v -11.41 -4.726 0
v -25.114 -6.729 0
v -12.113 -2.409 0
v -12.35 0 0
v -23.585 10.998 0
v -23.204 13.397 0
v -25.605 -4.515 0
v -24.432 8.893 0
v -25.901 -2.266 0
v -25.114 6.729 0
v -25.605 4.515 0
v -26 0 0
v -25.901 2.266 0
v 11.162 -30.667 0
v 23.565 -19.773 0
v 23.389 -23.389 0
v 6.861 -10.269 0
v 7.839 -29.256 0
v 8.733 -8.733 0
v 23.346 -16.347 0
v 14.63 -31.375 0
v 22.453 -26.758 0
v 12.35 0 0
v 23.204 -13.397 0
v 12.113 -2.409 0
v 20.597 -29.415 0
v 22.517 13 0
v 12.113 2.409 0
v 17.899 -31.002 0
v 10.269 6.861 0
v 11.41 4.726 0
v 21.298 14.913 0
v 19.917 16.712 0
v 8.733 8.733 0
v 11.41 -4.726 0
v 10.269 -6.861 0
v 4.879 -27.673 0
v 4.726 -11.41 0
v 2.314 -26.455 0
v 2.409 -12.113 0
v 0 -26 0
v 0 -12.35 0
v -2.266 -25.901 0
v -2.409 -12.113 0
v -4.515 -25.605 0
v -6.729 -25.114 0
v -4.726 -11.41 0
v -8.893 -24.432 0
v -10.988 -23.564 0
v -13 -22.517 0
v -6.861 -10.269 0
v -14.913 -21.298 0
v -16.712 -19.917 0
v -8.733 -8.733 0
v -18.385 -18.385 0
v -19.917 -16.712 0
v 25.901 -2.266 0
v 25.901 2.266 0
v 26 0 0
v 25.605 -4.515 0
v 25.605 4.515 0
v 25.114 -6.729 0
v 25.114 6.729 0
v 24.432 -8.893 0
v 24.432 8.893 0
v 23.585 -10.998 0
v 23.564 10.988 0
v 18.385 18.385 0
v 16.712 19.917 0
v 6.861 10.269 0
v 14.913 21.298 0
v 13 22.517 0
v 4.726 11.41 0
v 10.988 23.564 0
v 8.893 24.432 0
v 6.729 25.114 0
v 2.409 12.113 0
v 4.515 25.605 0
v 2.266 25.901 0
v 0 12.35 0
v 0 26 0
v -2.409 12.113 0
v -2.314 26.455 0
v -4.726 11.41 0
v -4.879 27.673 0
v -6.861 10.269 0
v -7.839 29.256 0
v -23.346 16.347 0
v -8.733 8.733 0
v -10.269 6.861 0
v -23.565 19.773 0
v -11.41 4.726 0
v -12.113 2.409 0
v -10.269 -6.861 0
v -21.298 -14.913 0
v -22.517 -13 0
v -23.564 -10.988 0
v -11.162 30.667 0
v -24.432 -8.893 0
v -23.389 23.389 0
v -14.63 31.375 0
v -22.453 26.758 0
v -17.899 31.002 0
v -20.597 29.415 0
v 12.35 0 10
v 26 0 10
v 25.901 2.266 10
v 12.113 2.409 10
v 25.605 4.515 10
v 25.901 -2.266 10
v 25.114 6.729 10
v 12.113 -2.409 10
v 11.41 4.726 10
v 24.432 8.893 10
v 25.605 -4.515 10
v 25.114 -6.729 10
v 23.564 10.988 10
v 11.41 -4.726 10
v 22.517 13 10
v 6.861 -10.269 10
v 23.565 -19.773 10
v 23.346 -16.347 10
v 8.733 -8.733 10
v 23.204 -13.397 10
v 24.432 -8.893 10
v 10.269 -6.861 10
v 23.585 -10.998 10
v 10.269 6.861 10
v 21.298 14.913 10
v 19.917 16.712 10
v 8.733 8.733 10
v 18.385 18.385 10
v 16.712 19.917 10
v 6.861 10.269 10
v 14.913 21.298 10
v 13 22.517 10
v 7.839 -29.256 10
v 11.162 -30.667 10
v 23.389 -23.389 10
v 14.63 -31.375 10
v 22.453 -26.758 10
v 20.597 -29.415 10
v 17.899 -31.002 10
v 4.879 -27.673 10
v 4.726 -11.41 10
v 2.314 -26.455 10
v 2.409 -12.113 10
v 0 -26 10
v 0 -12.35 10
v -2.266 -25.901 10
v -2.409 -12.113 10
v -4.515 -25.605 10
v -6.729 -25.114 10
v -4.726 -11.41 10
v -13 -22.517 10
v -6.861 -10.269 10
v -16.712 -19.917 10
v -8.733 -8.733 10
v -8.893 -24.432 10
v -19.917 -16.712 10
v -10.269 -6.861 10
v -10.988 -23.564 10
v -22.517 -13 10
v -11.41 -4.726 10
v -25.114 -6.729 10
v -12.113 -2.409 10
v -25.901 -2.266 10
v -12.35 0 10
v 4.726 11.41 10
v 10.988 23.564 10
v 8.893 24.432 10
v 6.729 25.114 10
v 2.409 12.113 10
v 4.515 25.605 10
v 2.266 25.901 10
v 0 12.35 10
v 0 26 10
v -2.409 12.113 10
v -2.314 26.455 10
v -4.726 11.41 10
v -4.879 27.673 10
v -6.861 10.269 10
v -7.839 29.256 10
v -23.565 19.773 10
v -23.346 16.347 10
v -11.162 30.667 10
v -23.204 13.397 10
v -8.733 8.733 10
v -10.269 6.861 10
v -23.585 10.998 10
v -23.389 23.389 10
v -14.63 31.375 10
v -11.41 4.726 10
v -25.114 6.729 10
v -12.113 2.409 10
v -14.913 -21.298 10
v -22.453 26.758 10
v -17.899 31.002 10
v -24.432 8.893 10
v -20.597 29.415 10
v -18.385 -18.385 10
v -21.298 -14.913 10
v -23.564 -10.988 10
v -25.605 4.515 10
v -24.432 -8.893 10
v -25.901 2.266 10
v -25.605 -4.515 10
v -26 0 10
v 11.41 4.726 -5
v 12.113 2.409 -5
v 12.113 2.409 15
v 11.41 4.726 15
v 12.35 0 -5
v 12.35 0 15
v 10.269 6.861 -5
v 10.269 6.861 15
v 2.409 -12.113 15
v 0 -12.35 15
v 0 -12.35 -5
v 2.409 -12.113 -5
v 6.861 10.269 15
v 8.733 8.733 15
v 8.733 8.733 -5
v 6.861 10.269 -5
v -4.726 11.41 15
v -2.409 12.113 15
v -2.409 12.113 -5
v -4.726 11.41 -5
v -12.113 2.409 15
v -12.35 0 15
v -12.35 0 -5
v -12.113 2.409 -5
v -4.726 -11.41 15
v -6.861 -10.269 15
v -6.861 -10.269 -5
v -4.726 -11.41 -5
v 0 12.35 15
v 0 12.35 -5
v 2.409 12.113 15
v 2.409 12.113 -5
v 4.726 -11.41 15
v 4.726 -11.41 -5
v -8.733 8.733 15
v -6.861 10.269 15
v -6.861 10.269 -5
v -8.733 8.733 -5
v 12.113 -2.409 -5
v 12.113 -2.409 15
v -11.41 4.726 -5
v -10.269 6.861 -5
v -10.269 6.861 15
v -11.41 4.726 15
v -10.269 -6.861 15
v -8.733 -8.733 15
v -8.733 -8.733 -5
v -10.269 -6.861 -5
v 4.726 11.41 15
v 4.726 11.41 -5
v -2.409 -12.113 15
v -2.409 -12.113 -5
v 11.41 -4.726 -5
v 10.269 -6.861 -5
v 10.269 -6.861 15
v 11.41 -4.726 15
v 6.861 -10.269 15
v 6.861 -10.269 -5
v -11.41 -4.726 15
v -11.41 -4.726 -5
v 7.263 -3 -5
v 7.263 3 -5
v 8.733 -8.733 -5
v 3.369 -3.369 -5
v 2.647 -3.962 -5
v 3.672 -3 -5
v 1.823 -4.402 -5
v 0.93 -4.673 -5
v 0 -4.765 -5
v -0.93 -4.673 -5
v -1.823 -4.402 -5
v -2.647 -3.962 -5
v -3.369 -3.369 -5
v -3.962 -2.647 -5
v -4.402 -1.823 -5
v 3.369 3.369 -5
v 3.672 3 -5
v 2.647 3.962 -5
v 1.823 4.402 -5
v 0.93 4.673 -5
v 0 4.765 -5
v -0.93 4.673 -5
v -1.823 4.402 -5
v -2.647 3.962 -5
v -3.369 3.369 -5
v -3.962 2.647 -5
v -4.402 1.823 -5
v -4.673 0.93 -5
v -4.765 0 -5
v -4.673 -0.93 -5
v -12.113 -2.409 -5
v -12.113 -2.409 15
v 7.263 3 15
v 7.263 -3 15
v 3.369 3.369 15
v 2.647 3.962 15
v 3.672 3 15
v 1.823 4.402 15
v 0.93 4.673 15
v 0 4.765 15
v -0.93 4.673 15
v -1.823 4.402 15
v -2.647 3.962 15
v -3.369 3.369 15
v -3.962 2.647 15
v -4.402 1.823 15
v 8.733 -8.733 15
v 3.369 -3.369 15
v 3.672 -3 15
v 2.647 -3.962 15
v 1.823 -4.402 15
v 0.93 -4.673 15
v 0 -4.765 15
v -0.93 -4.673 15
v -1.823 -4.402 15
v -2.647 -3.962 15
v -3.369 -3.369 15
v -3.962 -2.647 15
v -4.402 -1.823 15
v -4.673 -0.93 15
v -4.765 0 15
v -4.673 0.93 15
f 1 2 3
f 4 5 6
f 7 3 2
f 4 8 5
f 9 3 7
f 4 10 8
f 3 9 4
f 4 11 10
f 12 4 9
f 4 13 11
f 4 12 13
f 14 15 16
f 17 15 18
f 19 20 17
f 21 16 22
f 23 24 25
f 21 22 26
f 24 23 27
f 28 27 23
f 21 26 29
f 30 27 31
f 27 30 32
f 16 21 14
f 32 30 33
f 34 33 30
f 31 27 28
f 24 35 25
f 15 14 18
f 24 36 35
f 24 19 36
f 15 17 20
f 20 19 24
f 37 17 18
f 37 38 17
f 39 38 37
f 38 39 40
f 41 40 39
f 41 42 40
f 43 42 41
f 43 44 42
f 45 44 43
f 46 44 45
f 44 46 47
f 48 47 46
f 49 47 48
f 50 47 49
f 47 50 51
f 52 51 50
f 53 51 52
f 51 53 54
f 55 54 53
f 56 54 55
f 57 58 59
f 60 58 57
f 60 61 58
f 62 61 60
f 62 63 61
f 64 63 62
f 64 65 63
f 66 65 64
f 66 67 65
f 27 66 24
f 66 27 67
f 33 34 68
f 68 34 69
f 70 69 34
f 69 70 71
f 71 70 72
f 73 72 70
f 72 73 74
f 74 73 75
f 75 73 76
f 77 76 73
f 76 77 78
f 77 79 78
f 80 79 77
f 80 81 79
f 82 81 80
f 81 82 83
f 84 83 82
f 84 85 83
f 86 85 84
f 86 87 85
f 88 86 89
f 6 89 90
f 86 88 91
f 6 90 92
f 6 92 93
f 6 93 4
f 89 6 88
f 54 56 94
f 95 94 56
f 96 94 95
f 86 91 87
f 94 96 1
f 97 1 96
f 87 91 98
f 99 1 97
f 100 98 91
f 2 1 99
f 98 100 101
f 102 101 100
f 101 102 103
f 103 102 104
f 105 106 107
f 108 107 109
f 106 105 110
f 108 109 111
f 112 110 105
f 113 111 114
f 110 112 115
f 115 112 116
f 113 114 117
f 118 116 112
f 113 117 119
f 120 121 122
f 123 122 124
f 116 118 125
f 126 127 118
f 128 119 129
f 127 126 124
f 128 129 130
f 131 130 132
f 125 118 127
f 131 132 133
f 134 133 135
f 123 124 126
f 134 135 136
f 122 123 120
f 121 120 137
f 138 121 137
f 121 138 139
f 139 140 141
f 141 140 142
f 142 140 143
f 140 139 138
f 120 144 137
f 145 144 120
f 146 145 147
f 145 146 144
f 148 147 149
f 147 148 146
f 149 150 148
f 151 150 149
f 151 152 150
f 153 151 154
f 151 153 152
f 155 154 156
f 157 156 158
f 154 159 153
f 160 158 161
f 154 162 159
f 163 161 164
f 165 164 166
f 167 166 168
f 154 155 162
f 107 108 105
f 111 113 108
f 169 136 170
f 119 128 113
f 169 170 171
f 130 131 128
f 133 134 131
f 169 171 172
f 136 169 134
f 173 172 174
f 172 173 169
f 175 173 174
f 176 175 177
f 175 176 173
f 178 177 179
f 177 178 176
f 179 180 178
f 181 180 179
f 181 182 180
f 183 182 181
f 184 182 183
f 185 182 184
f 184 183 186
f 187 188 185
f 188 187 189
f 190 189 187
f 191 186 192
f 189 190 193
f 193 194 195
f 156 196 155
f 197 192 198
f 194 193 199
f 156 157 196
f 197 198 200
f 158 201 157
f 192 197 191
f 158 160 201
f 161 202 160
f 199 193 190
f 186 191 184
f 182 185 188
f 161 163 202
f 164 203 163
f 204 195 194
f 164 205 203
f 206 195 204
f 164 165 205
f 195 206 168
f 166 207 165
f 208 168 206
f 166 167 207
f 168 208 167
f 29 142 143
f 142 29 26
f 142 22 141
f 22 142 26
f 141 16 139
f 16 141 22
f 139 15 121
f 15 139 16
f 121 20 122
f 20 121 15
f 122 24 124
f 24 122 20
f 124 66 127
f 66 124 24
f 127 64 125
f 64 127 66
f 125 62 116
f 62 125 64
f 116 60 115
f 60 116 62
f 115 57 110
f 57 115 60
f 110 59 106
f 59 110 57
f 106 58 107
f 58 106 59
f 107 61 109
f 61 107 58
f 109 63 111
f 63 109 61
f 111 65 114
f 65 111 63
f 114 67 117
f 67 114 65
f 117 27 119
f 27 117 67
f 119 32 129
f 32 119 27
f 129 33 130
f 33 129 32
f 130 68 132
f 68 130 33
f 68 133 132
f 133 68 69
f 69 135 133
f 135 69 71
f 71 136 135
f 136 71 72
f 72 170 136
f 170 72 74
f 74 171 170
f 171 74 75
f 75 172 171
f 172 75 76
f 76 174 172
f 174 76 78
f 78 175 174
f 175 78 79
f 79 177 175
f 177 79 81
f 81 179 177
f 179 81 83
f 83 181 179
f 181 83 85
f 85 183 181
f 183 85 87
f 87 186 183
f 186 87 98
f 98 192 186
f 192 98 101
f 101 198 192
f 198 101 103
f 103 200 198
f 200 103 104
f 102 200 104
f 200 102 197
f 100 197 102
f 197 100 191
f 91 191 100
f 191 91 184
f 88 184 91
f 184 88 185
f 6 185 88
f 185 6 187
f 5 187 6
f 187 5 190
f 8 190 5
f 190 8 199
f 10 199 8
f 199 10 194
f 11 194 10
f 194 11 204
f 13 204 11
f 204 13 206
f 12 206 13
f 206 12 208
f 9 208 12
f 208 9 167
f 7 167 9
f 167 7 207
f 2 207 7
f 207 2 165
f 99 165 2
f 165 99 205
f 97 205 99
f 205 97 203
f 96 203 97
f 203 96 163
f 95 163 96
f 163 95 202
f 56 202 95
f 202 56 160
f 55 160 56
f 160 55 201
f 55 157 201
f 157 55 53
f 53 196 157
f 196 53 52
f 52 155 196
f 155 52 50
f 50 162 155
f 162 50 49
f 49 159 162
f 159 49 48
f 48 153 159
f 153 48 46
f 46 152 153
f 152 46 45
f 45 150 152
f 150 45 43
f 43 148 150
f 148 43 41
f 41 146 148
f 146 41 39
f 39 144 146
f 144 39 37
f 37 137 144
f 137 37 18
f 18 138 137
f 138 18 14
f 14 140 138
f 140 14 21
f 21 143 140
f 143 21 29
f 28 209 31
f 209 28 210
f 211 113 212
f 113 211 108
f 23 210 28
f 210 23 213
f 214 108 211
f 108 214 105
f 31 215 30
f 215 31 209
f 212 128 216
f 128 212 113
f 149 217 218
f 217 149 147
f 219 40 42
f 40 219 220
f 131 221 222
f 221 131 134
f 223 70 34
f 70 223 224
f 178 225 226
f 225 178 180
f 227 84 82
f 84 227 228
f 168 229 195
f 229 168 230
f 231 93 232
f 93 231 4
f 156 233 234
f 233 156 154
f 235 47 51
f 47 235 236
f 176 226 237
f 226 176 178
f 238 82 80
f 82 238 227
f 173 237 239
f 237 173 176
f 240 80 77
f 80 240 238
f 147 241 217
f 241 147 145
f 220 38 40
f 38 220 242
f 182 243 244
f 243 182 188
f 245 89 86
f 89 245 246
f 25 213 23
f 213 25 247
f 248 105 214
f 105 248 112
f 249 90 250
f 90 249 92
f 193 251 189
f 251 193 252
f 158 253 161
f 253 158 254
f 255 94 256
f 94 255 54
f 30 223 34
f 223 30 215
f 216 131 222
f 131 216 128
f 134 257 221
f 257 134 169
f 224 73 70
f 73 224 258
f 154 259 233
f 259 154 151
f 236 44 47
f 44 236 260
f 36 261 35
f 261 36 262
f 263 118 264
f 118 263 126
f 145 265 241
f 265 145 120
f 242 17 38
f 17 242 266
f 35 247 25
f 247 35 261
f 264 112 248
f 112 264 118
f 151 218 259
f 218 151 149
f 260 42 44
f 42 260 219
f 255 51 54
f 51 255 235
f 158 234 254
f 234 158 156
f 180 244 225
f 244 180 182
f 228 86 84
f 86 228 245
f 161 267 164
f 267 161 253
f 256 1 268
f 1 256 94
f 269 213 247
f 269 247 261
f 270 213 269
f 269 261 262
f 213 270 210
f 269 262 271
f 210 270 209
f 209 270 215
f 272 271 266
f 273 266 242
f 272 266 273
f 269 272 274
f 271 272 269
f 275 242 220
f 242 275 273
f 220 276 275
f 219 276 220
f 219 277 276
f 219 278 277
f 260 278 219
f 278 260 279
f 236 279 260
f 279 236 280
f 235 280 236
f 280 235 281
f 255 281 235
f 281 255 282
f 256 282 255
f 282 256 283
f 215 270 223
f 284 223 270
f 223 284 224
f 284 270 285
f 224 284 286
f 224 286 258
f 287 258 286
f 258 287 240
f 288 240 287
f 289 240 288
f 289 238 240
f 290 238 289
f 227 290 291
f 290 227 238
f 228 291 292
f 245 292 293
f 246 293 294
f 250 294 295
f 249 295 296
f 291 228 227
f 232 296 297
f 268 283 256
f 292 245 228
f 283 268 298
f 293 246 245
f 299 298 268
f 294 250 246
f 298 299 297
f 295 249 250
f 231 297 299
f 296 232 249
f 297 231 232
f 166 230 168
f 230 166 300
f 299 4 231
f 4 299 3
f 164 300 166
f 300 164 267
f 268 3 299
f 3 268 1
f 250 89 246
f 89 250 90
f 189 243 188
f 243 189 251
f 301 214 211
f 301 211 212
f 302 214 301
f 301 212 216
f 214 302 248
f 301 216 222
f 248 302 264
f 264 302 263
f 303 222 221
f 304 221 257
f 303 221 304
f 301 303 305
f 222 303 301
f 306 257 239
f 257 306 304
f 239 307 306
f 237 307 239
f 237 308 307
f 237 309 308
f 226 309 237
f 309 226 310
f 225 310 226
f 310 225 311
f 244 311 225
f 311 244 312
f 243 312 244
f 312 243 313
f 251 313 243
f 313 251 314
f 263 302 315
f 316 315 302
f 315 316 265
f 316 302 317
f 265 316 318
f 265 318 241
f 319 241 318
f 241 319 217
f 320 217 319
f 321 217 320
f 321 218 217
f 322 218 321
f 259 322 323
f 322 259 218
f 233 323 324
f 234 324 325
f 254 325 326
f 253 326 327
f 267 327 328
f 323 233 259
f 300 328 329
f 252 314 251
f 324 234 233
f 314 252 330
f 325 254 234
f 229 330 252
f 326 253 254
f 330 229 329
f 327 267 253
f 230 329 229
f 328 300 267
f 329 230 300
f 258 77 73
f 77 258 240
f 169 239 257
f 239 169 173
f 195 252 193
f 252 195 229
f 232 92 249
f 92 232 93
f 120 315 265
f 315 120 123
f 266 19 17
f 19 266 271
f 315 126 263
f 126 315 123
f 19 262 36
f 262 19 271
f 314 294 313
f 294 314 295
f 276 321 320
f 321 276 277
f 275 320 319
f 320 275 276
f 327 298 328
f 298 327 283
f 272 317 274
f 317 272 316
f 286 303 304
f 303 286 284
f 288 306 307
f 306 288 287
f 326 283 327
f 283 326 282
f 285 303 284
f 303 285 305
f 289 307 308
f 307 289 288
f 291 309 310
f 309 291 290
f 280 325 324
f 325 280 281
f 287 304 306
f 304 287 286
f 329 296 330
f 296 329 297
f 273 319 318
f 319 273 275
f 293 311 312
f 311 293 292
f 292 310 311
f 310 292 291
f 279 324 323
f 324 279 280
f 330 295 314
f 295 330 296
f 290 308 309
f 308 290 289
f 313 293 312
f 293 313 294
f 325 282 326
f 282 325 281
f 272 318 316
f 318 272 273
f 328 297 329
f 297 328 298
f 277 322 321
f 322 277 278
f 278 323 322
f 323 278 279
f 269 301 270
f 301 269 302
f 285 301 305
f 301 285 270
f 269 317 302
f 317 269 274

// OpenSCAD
$fn = 32;

// ----------------------------------------------------------------------
// Cam: base radius 26 mm with a 10 mm lift over 120 degrees
// ----------------------------------------------------------------------

// --- parameters (mm) ---
base_r = 26;              // base radius
lift = 10;                // lift height above the base radius
lift_span = 120;          // angular width of the lift
lift_start = 90;          // angle where the lift starts
cam_t = 10;               // cam plate thickness
hub_d = 24.7;             // hub diameter
hub_h = 20;               // hub height
bore_d = 9.53;            // bore
key_w = 6;                // keyway width
key_depth = 3;            // keyway depth

cam_profile = [[26, 0], [25.901, 2.266], [25.605, 4.515], [25.114, 6.729], [24.432, 8.893], [23.564, 10.988], [22.517, 13], [21.298, 14.913], [19.917, 16.712], [18.385, 18.385], [16.712, 19.917], [14.913, 21.298], [13, 22.517], [10.988, 23.564], [8.893, 24.432], [6.729, 25.114], [4.515, 25.605], [2.266, 25.901], [0, 26], [-2.314, 26.455], [-4.879, 27.673], [-7.839, 29.256], [-11.162, 30.667], [-14.63, 31.375], [-17.899, 31.002], [-20.597, 29.415], [-22.453, 26.758], [-23.389, 23.389], [-23.565, 19.773], [-23.346, 16.347], [-23.204, 13.397], [-23.585, 10.998], [-24.432, 8.893], [-25.114, 6.729], [-25.605, 4.515], [-25.901, 2.266], [-26, 0], [-25.901, -2.266], [-25.605, -4.515], [-25.114, -6.729], [-24.432, -8.893], [-23.564, -10.988], [-22.517, -13], [-21.298, -14.913], [-19.917, -16.712], [-18.385, -18.385], [-16.712, -19.917], [-14.913, -21.298], [-13, -22.517], [-10.988, -23.564], [-8.893, -24.432], [-6.729, -25.114], [-4.515, -25.605], [-2.266, -25.901], [0, -26], [2.314, -26.455], [4.879, -27.673], [7.839, -29.256], [11.162, -30.667], [14.63, -31.375], [17.899, -31.002], [20.597, -29.415], [22.453, -26.758], [23.389, -23.389], [23.565, -19.773], [23.346, -16.347], [23.204, -13.397], [23.585, -10.998], [24.432, -8.893], [25.114, -6.729], [25.605, -4.515], [25.901, -2.266]];

difference() {
  union() {
    linear_extrude(height = cam_t) polygon(cam_profile);
    /* hub, proud of the cam plate on both sides */
    translate([0, 0, -5]) cylinder(h = hub_h, d = hub_d);
  }
  /* bore through the hub, 2.5 mm clear on both faces */
  translate([0, 0, -7.5]) cylinder(h = hub_h + 5, d = bore_d);
  /* keyway, milled through the whole hub */
  translate([1.763, -3, -7.5]) cube([5.5, 6, 25]);
}
